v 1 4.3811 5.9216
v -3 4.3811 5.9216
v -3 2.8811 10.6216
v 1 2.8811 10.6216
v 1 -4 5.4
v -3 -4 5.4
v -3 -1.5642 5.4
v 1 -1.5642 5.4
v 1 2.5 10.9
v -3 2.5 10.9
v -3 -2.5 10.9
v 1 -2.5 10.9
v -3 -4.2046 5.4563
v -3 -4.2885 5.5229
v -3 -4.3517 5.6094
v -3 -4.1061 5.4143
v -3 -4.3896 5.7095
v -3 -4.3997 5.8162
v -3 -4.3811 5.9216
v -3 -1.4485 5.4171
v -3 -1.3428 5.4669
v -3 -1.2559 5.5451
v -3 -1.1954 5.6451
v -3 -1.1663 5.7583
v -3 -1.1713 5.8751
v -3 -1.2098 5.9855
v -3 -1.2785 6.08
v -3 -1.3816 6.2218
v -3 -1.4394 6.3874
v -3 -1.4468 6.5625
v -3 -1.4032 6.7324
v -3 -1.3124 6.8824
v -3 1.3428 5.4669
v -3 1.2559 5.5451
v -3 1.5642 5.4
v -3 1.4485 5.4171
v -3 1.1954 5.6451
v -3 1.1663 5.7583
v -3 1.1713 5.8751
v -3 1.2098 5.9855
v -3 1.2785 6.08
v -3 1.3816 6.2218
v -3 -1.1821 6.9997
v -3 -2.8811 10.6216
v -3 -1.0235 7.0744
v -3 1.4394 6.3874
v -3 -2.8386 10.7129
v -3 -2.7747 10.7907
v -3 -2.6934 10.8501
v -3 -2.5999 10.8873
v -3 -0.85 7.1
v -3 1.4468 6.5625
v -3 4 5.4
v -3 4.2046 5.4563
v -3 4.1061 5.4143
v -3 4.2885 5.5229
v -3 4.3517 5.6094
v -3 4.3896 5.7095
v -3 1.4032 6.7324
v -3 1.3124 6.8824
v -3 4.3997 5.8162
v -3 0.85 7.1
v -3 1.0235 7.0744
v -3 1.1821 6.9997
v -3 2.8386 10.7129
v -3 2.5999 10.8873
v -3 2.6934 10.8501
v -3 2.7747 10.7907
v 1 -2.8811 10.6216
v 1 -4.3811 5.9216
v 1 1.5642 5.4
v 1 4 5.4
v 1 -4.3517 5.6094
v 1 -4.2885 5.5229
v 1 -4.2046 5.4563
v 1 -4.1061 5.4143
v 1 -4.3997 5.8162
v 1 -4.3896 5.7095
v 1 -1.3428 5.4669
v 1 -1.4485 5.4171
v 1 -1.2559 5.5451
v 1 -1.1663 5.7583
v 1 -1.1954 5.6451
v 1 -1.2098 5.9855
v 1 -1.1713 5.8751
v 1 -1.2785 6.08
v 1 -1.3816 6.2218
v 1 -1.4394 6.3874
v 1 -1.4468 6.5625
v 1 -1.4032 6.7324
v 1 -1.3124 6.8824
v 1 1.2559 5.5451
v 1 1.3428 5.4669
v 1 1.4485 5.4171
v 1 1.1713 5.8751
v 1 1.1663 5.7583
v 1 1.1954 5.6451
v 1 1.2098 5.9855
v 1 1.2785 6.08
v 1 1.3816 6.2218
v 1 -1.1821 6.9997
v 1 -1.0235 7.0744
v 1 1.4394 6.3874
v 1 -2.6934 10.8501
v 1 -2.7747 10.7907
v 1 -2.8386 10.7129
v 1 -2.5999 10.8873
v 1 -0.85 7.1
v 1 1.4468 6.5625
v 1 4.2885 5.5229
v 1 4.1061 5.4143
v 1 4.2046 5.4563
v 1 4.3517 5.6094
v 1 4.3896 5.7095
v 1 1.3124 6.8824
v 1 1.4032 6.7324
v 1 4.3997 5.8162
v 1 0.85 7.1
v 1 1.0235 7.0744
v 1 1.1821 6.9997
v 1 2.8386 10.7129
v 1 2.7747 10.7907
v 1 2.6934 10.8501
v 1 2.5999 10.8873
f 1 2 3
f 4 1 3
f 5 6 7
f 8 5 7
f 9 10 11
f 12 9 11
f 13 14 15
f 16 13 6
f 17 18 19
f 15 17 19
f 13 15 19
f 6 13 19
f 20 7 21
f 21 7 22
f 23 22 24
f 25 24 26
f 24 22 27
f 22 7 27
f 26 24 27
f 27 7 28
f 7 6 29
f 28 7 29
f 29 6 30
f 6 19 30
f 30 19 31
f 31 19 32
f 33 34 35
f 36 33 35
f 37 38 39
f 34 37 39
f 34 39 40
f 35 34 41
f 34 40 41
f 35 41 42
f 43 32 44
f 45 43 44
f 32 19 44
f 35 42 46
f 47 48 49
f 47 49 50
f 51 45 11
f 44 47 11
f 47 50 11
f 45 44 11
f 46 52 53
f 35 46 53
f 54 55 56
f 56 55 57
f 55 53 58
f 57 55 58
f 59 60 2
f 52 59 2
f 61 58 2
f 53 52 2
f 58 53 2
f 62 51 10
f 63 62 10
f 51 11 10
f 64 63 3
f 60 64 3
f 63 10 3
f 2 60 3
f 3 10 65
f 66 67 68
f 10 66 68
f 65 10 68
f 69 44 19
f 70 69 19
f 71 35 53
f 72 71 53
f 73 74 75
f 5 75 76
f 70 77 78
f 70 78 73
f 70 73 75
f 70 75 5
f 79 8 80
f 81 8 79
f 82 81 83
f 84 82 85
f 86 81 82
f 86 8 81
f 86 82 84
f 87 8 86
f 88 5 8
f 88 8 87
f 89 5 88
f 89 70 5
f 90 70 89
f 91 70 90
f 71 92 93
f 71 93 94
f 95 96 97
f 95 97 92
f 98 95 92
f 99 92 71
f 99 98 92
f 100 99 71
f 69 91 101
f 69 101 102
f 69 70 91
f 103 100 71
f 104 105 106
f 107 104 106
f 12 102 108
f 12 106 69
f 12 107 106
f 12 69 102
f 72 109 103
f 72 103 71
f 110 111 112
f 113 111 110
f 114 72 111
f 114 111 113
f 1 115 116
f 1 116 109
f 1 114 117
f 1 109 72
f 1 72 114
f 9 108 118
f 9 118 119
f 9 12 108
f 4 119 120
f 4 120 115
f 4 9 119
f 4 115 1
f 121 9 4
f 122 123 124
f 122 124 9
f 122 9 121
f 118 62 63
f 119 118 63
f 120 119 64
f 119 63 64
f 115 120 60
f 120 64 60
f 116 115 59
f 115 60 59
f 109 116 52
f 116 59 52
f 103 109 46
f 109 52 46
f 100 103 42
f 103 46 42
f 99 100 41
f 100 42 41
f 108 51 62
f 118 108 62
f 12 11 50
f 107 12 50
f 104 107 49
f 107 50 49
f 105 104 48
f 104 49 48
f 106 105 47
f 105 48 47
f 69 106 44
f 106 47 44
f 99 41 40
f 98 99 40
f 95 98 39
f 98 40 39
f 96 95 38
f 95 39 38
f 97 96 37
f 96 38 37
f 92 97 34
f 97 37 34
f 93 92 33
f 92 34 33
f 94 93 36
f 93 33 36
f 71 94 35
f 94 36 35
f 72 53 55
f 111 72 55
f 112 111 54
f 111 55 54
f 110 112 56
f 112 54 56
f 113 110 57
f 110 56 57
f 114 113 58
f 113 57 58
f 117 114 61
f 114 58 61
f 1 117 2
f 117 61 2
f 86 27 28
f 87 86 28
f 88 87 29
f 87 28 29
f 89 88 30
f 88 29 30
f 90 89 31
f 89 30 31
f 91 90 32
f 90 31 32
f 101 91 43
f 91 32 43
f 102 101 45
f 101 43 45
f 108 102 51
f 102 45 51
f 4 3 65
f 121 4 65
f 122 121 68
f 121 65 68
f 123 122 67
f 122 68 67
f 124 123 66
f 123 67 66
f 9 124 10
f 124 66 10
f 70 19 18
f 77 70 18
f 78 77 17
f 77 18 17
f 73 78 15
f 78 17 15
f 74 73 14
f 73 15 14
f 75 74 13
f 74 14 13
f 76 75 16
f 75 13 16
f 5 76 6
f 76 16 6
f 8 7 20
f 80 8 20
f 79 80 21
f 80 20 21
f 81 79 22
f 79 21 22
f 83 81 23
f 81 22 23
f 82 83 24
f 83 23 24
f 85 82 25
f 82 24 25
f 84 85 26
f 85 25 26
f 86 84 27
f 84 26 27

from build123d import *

# Parameters (mm, degrees)
BOSS_EXTRUDE1_DEPTH      = 1
BOSS_EXTRUDE1_DEPTH_BACK = 3


with BuildPart() as part:
    # Sketch3 → Boss-Extrude1 (new, two sides: drawn at the far end of the back side and taken through both)
    with BuildSketch(Plane.YZ.offset(-BOSS_EXTRUDE1_DEPTH_BACK)):
        with BuildLine():
            Line((-4, 5.4), (-1.56416825, 5.4))
            ThreePointArc((-1.56416825, 5.4), (-1.195386471, 5.645080666), (-1.278511113, 6.08))
            ThreePointArc((-1.278511113, 6.08), (-1.403198074, 6.732379001), (-0.850025407, 7.1))
            Line((-0.850025407, 7.1), (0.850025407, 7.1))
            ThreePointArc((0.850025407, 7.1), (1.403198074, 6.732379001), (1.278511113, 6.08))
            ThreePointArc((1.278511113, 6.08), (1.195386471, 5.645080666), (1.56416825, 5.4))
            Line((1.56416825, 5.4), (4, 5.4))
            ThreePointArc((4, 5.4), (4.322991043, 5.564040711), (4.381063684, 5.92161607))
            Line((4.381063684, 5.92161607), (2.881063684, 10.62161607))
            ThreePointArc((2.881063684, 10.62161607), (2.735959289, 10.822991043), (2.5, 10.9))
            Line((2.5, 10.9), (-2.5, 10.9))
            ThreePointArc((-2.5, 10.9), (-2.735959289, 10.822991043), (-2.881063684, 10.62161607))
            Line((-2.881063684, 10.62161607), (-4.381063684, 5.92161607))
            ThreePointArc((-4.381063684, 5.92161607), (-4.322991043, 5.564040711), (-4, 5.4))
        make_face()
    extrude(amount=BOSS_EXTRUDE1_DEPTH + BOSS_EXTRUDE1_DEPTH_BACK)


solid = part.part
